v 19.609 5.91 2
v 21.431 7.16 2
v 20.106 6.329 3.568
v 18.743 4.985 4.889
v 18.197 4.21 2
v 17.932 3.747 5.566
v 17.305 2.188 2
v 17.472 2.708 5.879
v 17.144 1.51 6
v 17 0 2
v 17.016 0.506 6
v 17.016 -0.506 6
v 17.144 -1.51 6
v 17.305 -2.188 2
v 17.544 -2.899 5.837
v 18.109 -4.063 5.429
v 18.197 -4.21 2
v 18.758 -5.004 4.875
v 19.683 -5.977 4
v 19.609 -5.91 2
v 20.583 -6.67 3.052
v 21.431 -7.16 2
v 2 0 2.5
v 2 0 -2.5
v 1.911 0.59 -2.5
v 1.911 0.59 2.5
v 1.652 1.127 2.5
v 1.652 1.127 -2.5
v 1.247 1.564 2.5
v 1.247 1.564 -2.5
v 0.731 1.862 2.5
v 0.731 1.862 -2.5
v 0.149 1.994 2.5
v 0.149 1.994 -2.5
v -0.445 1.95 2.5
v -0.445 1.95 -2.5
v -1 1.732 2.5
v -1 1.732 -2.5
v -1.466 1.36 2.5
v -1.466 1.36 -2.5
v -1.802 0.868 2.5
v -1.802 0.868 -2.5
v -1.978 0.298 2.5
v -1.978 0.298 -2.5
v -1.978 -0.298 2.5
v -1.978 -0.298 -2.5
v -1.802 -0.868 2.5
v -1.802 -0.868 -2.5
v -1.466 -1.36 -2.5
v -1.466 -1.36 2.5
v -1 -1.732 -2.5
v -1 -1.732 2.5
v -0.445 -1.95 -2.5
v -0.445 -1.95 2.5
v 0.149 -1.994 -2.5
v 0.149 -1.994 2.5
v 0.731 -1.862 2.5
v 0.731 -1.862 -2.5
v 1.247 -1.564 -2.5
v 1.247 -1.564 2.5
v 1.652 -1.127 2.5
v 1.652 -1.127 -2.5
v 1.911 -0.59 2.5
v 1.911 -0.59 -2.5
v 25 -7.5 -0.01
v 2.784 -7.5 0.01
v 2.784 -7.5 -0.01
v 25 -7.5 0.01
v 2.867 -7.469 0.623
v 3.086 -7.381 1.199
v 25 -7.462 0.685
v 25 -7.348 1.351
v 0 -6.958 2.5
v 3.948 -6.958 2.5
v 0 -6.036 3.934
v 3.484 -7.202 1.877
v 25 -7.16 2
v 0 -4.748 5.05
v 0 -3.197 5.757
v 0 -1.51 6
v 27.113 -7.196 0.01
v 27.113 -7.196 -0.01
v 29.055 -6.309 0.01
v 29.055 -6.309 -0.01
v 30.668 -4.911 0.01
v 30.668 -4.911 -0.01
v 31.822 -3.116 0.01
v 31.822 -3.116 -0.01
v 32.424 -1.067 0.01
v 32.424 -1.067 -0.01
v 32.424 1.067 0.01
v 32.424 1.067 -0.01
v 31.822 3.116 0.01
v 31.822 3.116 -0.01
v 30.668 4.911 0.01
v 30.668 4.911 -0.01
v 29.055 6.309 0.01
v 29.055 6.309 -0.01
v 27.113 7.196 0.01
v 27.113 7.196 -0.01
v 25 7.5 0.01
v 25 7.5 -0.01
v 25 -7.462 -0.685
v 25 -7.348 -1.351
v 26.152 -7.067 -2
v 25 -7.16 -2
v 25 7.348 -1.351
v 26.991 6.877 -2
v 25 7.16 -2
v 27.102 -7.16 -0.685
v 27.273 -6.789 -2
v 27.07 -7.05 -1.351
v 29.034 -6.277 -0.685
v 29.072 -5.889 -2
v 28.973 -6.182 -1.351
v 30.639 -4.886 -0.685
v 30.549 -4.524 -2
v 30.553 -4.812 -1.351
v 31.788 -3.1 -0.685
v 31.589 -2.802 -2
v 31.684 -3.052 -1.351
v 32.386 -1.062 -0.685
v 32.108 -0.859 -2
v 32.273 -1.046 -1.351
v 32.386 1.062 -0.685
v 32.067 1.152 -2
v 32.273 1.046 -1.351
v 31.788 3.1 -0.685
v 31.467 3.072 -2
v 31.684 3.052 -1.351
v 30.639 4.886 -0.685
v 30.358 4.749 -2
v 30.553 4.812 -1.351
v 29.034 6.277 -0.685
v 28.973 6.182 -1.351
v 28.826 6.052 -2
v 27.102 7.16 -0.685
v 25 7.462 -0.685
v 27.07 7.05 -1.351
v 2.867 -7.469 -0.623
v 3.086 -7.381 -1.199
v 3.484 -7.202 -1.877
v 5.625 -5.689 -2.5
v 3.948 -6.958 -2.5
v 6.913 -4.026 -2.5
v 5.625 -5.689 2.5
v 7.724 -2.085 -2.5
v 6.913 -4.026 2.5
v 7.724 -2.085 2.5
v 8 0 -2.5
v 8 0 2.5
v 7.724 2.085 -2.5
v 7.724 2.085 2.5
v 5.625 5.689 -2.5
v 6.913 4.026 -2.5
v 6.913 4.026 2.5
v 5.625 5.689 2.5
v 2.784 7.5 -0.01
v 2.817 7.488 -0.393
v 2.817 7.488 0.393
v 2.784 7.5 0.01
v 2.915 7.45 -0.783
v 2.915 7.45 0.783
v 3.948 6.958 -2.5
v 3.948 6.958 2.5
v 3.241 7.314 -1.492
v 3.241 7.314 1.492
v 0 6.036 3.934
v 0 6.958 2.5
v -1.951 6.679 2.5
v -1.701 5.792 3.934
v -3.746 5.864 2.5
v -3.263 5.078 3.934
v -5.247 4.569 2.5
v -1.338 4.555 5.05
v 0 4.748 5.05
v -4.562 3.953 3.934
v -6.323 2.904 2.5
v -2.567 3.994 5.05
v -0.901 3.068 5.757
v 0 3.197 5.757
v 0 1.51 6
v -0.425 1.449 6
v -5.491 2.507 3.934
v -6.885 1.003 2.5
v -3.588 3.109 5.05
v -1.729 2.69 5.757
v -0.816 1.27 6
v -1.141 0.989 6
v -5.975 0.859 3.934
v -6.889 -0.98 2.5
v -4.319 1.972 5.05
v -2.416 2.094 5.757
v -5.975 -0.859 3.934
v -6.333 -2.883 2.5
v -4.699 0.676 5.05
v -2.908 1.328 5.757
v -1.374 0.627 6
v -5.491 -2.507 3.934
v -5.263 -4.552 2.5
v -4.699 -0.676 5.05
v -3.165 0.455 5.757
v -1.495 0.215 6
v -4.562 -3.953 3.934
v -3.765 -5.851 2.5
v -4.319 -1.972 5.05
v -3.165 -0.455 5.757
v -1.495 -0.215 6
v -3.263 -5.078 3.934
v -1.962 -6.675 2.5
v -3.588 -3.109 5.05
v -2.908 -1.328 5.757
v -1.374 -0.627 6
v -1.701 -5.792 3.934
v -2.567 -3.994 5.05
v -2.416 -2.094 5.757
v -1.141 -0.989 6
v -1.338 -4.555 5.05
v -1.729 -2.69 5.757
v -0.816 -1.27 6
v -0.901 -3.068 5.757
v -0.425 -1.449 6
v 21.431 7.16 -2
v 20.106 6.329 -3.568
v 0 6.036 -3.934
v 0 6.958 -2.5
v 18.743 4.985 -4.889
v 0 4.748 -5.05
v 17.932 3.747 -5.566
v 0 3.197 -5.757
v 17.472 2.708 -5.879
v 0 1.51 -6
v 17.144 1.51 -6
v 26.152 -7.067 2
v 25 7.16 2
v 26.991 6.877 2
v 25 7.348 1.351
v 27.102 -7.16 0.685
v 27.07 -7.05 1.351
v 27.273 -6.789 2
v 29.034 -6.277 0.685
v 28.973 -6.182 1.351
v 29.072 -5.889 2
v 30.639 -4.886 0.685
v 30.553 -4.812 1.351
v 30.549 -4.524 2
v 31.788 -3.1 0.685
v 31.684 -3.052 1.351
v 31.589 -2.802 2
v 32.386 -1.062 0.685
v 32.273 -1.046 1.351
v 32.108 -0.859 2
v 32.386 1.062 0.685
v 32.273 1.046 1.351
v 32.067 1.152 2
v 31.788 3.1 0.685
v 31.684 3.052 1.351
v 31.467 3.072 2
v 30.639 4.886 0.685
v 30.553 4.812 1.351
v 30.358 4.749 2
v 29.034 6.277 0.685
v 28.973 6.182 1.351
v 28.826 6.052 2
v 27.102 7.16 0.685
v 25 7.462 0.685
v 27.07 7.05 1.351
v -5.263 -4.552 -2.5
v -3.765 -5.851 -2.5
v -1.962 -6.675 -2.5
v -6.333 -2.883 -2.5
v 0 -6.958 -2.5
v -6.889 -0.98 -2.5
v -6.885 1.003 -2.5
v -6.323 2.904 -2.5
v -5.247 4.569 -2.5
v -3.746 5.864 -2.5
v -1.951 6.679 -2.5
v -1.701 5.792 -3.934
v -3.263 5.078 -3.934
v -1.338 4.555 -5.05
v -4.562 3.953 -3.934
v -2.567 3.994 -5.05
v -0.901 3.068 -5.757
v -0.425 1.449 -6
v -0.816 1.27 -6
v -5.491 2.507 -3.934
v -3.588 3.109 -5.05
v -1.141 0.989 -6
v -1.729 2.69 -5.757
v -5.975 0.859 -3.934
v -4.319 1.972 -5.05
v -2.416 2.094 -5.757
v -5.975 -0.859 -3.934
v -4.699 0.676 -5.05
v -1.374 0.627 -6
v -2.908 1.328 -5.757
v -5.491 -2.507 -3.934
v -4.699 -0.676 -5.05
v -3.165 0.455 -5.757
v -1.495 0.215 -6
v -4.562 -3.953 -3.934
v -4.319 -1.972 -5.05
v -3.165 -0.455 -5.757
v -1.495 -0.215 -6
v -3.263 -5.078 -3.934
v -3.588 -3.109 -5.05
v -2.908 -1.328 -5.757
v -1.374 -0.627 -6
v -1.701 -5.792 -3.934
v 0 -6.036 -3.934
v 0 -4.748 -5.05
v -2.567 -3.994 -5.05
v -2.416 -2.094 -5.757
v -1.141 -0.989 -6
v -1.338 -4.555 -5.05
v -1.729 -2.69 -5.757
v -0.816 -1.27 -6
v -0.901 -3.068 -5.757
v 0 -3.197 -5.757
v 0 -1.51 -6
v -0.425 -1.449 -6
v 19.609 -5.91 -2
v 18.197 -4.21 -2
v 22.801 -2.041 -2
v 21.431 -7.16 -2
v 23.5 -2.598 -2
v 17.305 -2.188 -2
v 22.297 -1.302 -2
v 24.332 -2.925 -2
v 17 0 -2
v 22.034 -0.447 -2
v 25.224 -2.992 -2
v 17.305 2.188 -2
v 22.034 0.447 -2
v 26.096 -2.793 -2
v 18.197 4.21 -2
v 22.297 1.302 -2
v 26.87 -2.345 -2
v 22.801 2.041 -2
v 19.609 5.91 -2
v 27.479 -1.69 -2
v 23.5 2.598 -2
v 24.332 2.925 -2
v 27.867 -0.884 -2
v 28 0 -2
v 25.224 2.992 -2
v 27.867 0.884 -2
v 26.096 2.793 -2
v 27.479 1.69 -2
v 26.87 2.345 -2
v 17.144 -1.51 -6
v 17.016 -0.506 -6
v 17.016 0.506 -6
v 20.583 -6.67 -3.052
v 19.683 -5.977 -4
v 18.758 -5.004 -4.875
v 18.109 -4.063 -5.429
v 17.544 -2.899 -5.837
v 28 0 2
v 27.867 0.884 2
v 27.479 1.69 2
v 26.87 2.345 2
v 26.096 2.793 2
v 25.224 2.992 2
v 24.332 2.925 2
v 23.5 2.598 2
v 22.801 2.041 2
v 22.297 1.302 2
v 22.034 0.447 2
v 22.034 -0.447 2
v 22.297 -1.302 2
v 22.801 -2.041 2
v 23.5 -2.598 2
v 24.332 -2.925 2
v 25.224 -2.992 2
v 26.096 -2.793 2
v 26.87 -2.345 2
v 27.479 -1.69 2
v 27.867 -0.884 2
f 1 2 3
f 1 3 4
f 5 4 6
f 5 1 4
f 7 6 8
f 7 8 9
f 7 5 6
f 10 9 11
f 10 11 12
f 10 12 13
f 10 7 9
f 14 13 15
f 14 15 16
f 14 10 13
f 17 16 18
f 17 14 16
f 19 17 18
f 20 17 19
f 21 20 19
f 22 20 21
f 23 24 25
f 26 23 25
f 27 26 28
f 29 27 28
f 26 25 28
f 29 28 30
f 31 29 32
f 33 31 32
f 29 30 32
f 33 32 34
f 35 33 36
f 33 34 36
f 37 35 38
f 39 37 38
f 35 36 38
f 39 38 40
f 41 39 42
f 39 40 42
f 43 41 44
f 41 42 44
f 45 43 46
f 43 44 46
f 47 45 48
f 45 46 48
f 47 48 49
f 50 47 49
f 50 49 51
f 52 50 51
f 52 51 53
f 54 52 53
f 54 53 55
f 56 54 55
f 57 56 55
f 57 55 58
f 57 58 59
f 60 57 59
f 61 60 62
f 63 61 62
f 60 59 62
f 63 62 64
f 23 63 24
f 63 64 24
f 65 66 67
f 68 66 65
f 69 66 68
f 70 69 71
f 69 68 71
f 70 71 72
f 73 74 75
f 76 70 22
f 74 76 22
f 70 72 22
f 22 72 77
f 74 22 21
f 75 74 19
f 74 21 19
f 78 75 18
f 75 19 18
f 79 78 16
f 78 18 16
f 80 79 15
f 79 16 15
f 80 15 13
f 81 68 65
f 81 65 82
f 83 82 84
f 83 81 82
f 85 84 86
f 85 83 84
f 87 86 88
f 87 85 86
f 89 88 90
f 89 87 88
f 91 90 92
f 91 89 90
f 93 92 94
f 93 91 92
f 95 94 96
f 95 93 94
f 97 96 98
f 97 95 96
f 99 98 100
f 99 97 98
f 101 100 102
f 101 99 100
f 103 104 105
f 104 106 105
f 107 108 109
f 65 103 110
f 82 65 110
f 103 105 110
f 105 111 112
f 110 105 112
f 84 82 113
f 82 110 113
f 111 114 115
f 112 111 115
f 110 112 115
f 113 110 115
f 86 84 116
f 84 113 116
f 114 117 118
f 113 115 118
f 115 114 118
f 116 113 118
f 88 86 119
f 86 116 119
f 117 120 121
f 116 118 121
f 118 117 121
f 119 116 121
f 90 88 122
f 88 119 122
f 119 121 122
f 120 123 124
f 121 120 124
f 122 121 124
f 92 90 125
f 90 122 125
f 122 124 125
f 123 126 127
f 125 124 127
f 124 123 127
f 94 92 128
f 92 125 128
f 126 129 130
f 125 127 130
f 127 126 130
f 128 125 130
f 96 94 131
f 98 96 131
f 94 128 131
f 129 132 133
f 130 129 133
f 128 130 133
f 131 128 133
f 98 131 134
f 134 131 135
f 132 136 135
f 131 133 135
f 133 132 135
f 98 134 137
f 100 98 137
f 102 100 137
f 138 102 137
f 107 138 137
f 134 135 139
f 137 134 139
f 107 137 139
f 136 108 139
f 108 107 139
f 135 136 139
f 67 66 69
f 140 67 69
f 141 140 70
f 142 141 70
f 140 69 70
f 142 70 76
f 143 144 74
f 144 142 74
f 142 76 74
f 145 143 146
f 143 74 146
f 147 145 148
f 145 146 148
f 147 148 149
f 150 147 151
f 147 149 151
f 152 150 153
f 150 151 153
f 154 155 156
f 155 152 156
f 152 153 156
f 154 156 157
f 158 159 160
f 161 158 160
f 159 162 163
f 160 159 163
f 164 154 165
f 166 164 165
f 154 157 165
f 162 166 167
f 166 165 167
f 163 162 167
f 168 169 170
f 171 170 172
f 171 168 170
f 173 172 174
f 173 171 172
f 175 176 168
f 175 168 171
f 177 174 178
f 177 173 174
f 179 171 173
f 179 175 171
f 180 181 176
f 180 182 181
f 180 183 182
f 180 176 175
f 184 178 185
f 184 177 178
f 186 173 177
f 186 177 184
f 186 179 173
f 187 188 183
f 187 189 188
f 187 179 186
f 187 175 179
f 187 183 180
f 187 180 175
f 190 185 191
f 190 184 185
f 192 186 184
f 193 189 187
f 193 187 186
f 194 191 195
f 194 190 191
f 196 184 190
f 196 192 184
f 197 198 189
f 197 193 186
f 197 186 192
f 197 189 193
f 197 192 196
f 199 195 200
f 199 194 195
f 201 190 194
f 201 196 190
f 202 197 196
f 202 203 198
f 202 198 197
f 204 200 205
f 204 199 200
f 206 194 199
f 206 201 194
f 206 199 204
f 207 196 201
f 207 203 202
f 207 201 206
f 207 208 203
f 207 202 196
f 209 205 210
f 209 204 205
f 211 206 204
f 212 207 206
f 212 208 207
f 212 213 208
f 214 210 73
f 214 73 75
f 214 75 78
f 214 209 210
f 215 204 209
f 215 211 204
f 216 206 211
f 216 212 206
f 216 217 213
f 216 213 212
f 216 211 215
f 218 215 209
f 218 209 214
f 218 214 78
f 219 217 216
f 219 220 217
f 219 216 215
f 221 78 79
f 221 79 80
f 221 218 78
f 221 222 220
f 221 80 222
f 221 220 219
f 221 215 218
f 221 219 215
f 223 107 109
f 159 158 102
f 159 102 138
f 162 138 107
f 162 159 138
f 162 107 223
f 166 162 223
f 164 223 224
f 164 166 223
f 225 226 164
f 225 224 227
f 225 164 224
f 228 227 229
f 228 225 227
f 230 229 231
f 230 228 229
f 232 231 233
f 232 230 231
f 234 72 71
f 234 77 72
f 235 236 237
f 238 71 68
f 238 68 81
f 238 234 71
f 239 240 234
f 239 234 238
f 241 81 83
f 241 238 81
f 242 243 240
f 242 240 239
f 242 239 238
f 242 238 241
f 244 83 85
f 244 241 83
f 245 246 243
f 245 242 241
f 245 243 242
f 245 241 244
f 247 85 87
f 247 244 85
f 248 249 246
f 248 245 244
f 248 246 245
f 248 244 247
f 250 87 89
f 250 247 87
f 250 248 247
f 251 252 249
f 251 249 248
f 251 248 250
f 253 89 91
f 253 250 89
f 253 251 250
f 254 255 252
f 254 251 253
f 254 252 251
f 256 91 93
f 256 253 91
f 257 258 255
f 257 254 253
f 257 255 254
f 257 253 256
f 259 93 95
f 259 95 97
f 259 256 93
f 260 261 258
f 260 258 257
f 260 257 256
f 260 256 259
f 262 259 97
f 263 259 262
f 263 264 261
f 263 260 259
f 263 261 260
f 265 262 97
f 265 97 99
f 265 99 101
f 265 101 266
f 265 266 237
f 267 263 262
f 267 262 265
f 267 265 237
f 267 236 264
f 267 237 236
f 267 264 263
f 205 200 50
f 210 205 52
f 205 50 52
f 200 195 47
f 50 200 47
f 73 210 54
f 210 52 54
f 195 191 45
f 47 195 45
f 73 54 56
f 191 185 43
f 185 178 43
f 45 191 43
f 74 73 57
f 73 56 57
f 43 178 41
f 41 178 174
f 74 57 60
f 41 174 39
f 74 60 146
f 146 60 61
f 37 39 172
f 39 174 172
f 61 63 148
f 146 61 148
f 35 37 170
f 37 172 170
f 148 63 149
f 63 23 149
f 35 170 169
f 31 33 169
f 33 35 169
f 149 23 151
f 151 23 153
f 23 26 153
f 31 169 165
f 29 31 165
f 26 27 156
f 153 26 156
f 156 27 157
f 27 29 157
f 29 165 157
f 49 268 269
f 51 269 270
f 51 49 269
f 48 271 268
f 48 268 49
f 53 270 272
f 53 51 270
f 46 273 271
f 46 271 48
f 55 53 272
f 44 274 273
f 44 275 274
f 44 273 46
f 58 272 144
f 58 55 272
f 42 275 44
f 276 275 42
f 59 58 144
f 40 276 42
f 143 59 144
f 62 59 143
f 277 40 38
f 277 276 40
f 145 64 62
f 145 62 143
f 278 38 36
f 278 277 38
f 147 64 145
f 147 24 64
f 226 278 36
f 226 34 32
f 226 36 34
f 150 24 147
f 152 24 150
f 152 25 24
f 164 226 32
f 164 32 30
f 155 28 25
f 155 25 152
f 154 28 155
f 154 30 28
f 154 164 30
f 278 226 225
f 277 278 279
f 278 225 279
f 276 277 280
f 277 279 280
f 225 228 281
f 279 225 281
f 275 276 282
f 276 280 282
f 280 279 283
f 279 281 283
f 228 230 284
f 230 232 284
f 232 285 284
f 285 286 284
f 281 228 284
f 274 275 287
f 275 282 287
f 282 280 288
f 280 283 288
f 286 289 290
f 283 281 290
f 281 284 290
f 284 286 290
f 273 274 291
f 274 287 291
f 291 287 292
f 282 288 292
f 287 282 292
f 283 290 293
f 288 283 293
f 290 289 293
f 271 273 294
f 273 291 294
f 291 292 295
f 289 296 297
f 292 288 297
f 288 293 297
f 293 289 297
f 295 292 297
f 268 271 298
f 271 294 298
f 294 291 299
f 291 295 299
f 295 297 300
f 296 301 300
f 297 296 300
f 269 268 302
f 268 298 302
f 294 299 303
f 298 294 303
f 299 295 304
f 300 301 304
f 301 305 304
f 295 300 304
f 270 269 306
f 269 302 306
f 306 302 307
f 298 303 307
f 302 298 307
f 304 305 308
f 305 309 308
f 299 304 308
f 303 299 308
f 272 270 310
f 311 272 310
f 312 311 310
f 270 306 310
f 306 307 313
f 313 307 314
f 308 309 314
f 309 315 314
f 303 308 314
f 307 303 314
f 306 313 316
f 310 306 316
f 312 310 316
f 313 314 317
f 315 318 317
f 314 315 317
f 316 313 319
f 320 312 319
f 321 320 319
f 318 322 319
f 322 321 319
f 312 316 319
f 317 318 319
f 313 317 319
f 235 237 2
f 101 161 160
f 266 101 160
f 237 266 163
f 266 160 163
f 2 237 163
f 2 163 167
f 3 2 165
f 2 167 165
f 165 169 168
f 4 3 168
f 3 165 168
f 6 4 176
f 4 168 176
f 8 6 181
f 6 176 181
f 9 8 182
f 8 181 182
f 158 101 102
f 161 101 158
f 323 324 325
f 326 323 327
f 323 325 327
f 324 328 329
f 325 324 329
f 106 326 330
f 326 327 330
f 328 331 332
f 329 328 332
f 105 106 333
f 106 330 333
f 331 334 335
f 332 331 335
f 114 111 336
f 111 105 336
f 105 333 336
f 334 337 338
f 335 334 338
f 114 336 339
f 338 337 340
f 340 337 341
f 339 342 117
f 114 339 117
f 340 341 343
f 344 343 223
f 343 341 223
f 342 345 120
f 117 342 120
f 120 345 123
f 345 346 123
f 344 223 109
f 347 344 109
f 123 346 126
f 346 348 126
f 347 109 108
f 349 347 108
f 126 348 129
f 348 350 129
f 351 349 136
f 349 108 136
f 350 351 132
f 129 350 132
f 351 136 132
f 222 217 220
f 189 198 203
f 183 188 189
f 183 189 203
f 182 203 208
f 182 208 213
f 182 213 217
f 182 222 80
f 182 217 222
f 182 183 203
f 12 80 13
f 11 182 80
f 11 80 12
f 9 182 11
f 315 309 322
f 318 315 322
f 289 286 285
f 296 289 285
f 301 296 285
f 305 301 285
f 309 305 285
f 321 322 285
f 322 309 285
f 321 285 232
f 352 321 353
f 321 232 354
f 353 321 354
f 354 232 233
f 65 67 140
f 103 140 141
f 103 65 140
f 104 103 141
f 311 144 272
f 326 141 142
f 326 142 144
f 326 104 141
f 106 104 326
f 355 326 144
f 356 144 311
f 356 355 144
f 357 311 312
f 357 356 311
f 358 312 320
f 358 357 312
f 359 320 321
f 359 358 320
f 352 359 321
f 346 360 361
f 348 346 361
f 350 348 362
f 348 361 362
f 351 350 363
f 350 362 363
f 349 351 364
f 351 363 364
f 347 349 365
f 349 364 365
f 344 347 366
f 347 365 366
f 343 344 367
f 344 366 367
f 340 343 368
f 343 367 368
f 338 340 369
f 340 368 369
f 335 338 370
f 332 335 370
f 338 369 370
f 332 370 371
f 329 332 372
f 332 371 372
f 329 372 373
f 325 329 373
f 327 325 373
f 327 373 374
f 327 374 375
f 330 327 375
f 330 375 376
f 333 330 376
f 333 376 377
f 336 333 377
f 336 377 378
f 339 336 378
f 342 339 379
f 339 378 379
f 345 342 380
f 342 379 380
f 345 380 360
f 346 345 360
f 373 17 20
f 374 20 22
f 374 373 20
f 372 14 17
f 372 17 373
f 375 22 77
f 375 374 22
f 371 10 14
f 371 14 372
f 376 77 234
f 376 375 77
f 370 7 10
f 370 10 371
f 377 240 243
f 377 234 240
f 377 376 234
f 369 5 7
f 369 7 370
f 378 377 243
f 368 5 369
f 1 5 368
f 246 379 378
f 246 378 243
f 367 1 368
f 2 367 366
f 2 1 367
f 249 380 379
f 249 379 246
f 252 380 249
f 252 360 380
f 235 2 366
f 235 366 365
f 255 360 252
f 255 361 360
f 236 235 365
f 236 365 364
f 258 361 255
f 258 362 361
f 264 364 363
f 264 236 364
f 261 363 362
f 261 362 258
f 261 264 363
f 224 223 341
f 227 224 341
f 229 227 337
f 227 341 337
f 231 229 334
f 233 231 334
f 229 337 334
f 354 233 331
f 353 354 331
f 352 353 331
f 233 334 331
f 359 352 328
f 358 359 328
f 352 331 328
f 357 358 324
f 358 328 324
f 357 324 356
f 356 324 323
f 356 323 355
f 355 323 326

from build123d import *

# Parameters (mm, degrees)
PAD_DEPTH       = 6
FILLET_R        = 5.99
SKETCH001_R     = 8
POCKET_DEPTH    = 2.5
SKETCH002_R     = 8
POCKET001_DEPTH = 4
SKETCH003_R     = 8
POCKET002_DEPTH = 4
SKETCH004_R     = 3
POCKET003_DEPTH = 4
SKETCH005_R     = 2
PAD001_DEPTH    = 5


with BuildPart() as part:
    # Sketch → Pad (new body, symmetric)
    with BuildSketch(Plane.XY):
        with BuildLine():
            ThreePointArc((0, 7.5), (-7.5, 0), (0, -7.5))
            Line((0, -7.5), (25, -7.5))
            ThreePointArc((25, -7.5), (32.5, 0), (25, 7.5))
            Line((25, 7.5), (0, 7.5))
        make_face()
    extrude(amount=PAD_DEPTH, both=True)

    # Fillet
    fillet_edges = [part.edges().sort_by_distance(p)[0] for p in [
        (-7.5, 0, 6),
        (12.5, -7.5, 6),
        (12.5, 7.5, 6),
        (32.5, 0, 6),
        (12.5, -7.5, -6),
        (-7.5, 0, -6),
        (32.5, 0, -6),
        (12.5, 7.5, -6),
    ]]
    fillet(fillet_edges, radius=FILLET_R)

    # Sketch001 → Pocket (cut, symmetric)
    with BuildSketch(Plane.XY):
        Circle(SKETCH001_R)
    extrude(amount=POCKET_DEPTH, both=True, mode=Mode.SUBTRACT)

    # Sketch002 → Pocket001 (cut)
    with BuildSketch(Plane.XY.offset(2)):
        with Locations((25, 0)):
            Circle(SKETCH002_R)
    extrude(amount=POCKET001_DEPTH, mode=Mode.SUBTRACT)

    # Sketch003 → Pocket002 (cut)
    with BuildSketch(Plane.XY.offset(-2)):
        with Locations((25, 0)):
            Circle(SKETCH003_R)
    extrude(amount=-POCKET002_DEPTH, mode=Mode.SUBTRACT)

    # Sketch004 (on Face17 of Pocket002) → Pocket003 (cut)
    with BuildSketch(Plane.XY.offset(2)):
        with Locations((25, 0)):
            Circle(SKETCH004_R)
    extrude(amount=-POCKET003_DEPTH, mode=Mode.SUBTRACT)

    # Sketch005 (on Face6 of Pocket003) → Pad001 (join)
    with BuildSketch(Plane.XY.offset(-2.5)):
        Circle(SKETCH005_R)
    extrude(amount=PAD001_DEPTH)


solid = part.part
